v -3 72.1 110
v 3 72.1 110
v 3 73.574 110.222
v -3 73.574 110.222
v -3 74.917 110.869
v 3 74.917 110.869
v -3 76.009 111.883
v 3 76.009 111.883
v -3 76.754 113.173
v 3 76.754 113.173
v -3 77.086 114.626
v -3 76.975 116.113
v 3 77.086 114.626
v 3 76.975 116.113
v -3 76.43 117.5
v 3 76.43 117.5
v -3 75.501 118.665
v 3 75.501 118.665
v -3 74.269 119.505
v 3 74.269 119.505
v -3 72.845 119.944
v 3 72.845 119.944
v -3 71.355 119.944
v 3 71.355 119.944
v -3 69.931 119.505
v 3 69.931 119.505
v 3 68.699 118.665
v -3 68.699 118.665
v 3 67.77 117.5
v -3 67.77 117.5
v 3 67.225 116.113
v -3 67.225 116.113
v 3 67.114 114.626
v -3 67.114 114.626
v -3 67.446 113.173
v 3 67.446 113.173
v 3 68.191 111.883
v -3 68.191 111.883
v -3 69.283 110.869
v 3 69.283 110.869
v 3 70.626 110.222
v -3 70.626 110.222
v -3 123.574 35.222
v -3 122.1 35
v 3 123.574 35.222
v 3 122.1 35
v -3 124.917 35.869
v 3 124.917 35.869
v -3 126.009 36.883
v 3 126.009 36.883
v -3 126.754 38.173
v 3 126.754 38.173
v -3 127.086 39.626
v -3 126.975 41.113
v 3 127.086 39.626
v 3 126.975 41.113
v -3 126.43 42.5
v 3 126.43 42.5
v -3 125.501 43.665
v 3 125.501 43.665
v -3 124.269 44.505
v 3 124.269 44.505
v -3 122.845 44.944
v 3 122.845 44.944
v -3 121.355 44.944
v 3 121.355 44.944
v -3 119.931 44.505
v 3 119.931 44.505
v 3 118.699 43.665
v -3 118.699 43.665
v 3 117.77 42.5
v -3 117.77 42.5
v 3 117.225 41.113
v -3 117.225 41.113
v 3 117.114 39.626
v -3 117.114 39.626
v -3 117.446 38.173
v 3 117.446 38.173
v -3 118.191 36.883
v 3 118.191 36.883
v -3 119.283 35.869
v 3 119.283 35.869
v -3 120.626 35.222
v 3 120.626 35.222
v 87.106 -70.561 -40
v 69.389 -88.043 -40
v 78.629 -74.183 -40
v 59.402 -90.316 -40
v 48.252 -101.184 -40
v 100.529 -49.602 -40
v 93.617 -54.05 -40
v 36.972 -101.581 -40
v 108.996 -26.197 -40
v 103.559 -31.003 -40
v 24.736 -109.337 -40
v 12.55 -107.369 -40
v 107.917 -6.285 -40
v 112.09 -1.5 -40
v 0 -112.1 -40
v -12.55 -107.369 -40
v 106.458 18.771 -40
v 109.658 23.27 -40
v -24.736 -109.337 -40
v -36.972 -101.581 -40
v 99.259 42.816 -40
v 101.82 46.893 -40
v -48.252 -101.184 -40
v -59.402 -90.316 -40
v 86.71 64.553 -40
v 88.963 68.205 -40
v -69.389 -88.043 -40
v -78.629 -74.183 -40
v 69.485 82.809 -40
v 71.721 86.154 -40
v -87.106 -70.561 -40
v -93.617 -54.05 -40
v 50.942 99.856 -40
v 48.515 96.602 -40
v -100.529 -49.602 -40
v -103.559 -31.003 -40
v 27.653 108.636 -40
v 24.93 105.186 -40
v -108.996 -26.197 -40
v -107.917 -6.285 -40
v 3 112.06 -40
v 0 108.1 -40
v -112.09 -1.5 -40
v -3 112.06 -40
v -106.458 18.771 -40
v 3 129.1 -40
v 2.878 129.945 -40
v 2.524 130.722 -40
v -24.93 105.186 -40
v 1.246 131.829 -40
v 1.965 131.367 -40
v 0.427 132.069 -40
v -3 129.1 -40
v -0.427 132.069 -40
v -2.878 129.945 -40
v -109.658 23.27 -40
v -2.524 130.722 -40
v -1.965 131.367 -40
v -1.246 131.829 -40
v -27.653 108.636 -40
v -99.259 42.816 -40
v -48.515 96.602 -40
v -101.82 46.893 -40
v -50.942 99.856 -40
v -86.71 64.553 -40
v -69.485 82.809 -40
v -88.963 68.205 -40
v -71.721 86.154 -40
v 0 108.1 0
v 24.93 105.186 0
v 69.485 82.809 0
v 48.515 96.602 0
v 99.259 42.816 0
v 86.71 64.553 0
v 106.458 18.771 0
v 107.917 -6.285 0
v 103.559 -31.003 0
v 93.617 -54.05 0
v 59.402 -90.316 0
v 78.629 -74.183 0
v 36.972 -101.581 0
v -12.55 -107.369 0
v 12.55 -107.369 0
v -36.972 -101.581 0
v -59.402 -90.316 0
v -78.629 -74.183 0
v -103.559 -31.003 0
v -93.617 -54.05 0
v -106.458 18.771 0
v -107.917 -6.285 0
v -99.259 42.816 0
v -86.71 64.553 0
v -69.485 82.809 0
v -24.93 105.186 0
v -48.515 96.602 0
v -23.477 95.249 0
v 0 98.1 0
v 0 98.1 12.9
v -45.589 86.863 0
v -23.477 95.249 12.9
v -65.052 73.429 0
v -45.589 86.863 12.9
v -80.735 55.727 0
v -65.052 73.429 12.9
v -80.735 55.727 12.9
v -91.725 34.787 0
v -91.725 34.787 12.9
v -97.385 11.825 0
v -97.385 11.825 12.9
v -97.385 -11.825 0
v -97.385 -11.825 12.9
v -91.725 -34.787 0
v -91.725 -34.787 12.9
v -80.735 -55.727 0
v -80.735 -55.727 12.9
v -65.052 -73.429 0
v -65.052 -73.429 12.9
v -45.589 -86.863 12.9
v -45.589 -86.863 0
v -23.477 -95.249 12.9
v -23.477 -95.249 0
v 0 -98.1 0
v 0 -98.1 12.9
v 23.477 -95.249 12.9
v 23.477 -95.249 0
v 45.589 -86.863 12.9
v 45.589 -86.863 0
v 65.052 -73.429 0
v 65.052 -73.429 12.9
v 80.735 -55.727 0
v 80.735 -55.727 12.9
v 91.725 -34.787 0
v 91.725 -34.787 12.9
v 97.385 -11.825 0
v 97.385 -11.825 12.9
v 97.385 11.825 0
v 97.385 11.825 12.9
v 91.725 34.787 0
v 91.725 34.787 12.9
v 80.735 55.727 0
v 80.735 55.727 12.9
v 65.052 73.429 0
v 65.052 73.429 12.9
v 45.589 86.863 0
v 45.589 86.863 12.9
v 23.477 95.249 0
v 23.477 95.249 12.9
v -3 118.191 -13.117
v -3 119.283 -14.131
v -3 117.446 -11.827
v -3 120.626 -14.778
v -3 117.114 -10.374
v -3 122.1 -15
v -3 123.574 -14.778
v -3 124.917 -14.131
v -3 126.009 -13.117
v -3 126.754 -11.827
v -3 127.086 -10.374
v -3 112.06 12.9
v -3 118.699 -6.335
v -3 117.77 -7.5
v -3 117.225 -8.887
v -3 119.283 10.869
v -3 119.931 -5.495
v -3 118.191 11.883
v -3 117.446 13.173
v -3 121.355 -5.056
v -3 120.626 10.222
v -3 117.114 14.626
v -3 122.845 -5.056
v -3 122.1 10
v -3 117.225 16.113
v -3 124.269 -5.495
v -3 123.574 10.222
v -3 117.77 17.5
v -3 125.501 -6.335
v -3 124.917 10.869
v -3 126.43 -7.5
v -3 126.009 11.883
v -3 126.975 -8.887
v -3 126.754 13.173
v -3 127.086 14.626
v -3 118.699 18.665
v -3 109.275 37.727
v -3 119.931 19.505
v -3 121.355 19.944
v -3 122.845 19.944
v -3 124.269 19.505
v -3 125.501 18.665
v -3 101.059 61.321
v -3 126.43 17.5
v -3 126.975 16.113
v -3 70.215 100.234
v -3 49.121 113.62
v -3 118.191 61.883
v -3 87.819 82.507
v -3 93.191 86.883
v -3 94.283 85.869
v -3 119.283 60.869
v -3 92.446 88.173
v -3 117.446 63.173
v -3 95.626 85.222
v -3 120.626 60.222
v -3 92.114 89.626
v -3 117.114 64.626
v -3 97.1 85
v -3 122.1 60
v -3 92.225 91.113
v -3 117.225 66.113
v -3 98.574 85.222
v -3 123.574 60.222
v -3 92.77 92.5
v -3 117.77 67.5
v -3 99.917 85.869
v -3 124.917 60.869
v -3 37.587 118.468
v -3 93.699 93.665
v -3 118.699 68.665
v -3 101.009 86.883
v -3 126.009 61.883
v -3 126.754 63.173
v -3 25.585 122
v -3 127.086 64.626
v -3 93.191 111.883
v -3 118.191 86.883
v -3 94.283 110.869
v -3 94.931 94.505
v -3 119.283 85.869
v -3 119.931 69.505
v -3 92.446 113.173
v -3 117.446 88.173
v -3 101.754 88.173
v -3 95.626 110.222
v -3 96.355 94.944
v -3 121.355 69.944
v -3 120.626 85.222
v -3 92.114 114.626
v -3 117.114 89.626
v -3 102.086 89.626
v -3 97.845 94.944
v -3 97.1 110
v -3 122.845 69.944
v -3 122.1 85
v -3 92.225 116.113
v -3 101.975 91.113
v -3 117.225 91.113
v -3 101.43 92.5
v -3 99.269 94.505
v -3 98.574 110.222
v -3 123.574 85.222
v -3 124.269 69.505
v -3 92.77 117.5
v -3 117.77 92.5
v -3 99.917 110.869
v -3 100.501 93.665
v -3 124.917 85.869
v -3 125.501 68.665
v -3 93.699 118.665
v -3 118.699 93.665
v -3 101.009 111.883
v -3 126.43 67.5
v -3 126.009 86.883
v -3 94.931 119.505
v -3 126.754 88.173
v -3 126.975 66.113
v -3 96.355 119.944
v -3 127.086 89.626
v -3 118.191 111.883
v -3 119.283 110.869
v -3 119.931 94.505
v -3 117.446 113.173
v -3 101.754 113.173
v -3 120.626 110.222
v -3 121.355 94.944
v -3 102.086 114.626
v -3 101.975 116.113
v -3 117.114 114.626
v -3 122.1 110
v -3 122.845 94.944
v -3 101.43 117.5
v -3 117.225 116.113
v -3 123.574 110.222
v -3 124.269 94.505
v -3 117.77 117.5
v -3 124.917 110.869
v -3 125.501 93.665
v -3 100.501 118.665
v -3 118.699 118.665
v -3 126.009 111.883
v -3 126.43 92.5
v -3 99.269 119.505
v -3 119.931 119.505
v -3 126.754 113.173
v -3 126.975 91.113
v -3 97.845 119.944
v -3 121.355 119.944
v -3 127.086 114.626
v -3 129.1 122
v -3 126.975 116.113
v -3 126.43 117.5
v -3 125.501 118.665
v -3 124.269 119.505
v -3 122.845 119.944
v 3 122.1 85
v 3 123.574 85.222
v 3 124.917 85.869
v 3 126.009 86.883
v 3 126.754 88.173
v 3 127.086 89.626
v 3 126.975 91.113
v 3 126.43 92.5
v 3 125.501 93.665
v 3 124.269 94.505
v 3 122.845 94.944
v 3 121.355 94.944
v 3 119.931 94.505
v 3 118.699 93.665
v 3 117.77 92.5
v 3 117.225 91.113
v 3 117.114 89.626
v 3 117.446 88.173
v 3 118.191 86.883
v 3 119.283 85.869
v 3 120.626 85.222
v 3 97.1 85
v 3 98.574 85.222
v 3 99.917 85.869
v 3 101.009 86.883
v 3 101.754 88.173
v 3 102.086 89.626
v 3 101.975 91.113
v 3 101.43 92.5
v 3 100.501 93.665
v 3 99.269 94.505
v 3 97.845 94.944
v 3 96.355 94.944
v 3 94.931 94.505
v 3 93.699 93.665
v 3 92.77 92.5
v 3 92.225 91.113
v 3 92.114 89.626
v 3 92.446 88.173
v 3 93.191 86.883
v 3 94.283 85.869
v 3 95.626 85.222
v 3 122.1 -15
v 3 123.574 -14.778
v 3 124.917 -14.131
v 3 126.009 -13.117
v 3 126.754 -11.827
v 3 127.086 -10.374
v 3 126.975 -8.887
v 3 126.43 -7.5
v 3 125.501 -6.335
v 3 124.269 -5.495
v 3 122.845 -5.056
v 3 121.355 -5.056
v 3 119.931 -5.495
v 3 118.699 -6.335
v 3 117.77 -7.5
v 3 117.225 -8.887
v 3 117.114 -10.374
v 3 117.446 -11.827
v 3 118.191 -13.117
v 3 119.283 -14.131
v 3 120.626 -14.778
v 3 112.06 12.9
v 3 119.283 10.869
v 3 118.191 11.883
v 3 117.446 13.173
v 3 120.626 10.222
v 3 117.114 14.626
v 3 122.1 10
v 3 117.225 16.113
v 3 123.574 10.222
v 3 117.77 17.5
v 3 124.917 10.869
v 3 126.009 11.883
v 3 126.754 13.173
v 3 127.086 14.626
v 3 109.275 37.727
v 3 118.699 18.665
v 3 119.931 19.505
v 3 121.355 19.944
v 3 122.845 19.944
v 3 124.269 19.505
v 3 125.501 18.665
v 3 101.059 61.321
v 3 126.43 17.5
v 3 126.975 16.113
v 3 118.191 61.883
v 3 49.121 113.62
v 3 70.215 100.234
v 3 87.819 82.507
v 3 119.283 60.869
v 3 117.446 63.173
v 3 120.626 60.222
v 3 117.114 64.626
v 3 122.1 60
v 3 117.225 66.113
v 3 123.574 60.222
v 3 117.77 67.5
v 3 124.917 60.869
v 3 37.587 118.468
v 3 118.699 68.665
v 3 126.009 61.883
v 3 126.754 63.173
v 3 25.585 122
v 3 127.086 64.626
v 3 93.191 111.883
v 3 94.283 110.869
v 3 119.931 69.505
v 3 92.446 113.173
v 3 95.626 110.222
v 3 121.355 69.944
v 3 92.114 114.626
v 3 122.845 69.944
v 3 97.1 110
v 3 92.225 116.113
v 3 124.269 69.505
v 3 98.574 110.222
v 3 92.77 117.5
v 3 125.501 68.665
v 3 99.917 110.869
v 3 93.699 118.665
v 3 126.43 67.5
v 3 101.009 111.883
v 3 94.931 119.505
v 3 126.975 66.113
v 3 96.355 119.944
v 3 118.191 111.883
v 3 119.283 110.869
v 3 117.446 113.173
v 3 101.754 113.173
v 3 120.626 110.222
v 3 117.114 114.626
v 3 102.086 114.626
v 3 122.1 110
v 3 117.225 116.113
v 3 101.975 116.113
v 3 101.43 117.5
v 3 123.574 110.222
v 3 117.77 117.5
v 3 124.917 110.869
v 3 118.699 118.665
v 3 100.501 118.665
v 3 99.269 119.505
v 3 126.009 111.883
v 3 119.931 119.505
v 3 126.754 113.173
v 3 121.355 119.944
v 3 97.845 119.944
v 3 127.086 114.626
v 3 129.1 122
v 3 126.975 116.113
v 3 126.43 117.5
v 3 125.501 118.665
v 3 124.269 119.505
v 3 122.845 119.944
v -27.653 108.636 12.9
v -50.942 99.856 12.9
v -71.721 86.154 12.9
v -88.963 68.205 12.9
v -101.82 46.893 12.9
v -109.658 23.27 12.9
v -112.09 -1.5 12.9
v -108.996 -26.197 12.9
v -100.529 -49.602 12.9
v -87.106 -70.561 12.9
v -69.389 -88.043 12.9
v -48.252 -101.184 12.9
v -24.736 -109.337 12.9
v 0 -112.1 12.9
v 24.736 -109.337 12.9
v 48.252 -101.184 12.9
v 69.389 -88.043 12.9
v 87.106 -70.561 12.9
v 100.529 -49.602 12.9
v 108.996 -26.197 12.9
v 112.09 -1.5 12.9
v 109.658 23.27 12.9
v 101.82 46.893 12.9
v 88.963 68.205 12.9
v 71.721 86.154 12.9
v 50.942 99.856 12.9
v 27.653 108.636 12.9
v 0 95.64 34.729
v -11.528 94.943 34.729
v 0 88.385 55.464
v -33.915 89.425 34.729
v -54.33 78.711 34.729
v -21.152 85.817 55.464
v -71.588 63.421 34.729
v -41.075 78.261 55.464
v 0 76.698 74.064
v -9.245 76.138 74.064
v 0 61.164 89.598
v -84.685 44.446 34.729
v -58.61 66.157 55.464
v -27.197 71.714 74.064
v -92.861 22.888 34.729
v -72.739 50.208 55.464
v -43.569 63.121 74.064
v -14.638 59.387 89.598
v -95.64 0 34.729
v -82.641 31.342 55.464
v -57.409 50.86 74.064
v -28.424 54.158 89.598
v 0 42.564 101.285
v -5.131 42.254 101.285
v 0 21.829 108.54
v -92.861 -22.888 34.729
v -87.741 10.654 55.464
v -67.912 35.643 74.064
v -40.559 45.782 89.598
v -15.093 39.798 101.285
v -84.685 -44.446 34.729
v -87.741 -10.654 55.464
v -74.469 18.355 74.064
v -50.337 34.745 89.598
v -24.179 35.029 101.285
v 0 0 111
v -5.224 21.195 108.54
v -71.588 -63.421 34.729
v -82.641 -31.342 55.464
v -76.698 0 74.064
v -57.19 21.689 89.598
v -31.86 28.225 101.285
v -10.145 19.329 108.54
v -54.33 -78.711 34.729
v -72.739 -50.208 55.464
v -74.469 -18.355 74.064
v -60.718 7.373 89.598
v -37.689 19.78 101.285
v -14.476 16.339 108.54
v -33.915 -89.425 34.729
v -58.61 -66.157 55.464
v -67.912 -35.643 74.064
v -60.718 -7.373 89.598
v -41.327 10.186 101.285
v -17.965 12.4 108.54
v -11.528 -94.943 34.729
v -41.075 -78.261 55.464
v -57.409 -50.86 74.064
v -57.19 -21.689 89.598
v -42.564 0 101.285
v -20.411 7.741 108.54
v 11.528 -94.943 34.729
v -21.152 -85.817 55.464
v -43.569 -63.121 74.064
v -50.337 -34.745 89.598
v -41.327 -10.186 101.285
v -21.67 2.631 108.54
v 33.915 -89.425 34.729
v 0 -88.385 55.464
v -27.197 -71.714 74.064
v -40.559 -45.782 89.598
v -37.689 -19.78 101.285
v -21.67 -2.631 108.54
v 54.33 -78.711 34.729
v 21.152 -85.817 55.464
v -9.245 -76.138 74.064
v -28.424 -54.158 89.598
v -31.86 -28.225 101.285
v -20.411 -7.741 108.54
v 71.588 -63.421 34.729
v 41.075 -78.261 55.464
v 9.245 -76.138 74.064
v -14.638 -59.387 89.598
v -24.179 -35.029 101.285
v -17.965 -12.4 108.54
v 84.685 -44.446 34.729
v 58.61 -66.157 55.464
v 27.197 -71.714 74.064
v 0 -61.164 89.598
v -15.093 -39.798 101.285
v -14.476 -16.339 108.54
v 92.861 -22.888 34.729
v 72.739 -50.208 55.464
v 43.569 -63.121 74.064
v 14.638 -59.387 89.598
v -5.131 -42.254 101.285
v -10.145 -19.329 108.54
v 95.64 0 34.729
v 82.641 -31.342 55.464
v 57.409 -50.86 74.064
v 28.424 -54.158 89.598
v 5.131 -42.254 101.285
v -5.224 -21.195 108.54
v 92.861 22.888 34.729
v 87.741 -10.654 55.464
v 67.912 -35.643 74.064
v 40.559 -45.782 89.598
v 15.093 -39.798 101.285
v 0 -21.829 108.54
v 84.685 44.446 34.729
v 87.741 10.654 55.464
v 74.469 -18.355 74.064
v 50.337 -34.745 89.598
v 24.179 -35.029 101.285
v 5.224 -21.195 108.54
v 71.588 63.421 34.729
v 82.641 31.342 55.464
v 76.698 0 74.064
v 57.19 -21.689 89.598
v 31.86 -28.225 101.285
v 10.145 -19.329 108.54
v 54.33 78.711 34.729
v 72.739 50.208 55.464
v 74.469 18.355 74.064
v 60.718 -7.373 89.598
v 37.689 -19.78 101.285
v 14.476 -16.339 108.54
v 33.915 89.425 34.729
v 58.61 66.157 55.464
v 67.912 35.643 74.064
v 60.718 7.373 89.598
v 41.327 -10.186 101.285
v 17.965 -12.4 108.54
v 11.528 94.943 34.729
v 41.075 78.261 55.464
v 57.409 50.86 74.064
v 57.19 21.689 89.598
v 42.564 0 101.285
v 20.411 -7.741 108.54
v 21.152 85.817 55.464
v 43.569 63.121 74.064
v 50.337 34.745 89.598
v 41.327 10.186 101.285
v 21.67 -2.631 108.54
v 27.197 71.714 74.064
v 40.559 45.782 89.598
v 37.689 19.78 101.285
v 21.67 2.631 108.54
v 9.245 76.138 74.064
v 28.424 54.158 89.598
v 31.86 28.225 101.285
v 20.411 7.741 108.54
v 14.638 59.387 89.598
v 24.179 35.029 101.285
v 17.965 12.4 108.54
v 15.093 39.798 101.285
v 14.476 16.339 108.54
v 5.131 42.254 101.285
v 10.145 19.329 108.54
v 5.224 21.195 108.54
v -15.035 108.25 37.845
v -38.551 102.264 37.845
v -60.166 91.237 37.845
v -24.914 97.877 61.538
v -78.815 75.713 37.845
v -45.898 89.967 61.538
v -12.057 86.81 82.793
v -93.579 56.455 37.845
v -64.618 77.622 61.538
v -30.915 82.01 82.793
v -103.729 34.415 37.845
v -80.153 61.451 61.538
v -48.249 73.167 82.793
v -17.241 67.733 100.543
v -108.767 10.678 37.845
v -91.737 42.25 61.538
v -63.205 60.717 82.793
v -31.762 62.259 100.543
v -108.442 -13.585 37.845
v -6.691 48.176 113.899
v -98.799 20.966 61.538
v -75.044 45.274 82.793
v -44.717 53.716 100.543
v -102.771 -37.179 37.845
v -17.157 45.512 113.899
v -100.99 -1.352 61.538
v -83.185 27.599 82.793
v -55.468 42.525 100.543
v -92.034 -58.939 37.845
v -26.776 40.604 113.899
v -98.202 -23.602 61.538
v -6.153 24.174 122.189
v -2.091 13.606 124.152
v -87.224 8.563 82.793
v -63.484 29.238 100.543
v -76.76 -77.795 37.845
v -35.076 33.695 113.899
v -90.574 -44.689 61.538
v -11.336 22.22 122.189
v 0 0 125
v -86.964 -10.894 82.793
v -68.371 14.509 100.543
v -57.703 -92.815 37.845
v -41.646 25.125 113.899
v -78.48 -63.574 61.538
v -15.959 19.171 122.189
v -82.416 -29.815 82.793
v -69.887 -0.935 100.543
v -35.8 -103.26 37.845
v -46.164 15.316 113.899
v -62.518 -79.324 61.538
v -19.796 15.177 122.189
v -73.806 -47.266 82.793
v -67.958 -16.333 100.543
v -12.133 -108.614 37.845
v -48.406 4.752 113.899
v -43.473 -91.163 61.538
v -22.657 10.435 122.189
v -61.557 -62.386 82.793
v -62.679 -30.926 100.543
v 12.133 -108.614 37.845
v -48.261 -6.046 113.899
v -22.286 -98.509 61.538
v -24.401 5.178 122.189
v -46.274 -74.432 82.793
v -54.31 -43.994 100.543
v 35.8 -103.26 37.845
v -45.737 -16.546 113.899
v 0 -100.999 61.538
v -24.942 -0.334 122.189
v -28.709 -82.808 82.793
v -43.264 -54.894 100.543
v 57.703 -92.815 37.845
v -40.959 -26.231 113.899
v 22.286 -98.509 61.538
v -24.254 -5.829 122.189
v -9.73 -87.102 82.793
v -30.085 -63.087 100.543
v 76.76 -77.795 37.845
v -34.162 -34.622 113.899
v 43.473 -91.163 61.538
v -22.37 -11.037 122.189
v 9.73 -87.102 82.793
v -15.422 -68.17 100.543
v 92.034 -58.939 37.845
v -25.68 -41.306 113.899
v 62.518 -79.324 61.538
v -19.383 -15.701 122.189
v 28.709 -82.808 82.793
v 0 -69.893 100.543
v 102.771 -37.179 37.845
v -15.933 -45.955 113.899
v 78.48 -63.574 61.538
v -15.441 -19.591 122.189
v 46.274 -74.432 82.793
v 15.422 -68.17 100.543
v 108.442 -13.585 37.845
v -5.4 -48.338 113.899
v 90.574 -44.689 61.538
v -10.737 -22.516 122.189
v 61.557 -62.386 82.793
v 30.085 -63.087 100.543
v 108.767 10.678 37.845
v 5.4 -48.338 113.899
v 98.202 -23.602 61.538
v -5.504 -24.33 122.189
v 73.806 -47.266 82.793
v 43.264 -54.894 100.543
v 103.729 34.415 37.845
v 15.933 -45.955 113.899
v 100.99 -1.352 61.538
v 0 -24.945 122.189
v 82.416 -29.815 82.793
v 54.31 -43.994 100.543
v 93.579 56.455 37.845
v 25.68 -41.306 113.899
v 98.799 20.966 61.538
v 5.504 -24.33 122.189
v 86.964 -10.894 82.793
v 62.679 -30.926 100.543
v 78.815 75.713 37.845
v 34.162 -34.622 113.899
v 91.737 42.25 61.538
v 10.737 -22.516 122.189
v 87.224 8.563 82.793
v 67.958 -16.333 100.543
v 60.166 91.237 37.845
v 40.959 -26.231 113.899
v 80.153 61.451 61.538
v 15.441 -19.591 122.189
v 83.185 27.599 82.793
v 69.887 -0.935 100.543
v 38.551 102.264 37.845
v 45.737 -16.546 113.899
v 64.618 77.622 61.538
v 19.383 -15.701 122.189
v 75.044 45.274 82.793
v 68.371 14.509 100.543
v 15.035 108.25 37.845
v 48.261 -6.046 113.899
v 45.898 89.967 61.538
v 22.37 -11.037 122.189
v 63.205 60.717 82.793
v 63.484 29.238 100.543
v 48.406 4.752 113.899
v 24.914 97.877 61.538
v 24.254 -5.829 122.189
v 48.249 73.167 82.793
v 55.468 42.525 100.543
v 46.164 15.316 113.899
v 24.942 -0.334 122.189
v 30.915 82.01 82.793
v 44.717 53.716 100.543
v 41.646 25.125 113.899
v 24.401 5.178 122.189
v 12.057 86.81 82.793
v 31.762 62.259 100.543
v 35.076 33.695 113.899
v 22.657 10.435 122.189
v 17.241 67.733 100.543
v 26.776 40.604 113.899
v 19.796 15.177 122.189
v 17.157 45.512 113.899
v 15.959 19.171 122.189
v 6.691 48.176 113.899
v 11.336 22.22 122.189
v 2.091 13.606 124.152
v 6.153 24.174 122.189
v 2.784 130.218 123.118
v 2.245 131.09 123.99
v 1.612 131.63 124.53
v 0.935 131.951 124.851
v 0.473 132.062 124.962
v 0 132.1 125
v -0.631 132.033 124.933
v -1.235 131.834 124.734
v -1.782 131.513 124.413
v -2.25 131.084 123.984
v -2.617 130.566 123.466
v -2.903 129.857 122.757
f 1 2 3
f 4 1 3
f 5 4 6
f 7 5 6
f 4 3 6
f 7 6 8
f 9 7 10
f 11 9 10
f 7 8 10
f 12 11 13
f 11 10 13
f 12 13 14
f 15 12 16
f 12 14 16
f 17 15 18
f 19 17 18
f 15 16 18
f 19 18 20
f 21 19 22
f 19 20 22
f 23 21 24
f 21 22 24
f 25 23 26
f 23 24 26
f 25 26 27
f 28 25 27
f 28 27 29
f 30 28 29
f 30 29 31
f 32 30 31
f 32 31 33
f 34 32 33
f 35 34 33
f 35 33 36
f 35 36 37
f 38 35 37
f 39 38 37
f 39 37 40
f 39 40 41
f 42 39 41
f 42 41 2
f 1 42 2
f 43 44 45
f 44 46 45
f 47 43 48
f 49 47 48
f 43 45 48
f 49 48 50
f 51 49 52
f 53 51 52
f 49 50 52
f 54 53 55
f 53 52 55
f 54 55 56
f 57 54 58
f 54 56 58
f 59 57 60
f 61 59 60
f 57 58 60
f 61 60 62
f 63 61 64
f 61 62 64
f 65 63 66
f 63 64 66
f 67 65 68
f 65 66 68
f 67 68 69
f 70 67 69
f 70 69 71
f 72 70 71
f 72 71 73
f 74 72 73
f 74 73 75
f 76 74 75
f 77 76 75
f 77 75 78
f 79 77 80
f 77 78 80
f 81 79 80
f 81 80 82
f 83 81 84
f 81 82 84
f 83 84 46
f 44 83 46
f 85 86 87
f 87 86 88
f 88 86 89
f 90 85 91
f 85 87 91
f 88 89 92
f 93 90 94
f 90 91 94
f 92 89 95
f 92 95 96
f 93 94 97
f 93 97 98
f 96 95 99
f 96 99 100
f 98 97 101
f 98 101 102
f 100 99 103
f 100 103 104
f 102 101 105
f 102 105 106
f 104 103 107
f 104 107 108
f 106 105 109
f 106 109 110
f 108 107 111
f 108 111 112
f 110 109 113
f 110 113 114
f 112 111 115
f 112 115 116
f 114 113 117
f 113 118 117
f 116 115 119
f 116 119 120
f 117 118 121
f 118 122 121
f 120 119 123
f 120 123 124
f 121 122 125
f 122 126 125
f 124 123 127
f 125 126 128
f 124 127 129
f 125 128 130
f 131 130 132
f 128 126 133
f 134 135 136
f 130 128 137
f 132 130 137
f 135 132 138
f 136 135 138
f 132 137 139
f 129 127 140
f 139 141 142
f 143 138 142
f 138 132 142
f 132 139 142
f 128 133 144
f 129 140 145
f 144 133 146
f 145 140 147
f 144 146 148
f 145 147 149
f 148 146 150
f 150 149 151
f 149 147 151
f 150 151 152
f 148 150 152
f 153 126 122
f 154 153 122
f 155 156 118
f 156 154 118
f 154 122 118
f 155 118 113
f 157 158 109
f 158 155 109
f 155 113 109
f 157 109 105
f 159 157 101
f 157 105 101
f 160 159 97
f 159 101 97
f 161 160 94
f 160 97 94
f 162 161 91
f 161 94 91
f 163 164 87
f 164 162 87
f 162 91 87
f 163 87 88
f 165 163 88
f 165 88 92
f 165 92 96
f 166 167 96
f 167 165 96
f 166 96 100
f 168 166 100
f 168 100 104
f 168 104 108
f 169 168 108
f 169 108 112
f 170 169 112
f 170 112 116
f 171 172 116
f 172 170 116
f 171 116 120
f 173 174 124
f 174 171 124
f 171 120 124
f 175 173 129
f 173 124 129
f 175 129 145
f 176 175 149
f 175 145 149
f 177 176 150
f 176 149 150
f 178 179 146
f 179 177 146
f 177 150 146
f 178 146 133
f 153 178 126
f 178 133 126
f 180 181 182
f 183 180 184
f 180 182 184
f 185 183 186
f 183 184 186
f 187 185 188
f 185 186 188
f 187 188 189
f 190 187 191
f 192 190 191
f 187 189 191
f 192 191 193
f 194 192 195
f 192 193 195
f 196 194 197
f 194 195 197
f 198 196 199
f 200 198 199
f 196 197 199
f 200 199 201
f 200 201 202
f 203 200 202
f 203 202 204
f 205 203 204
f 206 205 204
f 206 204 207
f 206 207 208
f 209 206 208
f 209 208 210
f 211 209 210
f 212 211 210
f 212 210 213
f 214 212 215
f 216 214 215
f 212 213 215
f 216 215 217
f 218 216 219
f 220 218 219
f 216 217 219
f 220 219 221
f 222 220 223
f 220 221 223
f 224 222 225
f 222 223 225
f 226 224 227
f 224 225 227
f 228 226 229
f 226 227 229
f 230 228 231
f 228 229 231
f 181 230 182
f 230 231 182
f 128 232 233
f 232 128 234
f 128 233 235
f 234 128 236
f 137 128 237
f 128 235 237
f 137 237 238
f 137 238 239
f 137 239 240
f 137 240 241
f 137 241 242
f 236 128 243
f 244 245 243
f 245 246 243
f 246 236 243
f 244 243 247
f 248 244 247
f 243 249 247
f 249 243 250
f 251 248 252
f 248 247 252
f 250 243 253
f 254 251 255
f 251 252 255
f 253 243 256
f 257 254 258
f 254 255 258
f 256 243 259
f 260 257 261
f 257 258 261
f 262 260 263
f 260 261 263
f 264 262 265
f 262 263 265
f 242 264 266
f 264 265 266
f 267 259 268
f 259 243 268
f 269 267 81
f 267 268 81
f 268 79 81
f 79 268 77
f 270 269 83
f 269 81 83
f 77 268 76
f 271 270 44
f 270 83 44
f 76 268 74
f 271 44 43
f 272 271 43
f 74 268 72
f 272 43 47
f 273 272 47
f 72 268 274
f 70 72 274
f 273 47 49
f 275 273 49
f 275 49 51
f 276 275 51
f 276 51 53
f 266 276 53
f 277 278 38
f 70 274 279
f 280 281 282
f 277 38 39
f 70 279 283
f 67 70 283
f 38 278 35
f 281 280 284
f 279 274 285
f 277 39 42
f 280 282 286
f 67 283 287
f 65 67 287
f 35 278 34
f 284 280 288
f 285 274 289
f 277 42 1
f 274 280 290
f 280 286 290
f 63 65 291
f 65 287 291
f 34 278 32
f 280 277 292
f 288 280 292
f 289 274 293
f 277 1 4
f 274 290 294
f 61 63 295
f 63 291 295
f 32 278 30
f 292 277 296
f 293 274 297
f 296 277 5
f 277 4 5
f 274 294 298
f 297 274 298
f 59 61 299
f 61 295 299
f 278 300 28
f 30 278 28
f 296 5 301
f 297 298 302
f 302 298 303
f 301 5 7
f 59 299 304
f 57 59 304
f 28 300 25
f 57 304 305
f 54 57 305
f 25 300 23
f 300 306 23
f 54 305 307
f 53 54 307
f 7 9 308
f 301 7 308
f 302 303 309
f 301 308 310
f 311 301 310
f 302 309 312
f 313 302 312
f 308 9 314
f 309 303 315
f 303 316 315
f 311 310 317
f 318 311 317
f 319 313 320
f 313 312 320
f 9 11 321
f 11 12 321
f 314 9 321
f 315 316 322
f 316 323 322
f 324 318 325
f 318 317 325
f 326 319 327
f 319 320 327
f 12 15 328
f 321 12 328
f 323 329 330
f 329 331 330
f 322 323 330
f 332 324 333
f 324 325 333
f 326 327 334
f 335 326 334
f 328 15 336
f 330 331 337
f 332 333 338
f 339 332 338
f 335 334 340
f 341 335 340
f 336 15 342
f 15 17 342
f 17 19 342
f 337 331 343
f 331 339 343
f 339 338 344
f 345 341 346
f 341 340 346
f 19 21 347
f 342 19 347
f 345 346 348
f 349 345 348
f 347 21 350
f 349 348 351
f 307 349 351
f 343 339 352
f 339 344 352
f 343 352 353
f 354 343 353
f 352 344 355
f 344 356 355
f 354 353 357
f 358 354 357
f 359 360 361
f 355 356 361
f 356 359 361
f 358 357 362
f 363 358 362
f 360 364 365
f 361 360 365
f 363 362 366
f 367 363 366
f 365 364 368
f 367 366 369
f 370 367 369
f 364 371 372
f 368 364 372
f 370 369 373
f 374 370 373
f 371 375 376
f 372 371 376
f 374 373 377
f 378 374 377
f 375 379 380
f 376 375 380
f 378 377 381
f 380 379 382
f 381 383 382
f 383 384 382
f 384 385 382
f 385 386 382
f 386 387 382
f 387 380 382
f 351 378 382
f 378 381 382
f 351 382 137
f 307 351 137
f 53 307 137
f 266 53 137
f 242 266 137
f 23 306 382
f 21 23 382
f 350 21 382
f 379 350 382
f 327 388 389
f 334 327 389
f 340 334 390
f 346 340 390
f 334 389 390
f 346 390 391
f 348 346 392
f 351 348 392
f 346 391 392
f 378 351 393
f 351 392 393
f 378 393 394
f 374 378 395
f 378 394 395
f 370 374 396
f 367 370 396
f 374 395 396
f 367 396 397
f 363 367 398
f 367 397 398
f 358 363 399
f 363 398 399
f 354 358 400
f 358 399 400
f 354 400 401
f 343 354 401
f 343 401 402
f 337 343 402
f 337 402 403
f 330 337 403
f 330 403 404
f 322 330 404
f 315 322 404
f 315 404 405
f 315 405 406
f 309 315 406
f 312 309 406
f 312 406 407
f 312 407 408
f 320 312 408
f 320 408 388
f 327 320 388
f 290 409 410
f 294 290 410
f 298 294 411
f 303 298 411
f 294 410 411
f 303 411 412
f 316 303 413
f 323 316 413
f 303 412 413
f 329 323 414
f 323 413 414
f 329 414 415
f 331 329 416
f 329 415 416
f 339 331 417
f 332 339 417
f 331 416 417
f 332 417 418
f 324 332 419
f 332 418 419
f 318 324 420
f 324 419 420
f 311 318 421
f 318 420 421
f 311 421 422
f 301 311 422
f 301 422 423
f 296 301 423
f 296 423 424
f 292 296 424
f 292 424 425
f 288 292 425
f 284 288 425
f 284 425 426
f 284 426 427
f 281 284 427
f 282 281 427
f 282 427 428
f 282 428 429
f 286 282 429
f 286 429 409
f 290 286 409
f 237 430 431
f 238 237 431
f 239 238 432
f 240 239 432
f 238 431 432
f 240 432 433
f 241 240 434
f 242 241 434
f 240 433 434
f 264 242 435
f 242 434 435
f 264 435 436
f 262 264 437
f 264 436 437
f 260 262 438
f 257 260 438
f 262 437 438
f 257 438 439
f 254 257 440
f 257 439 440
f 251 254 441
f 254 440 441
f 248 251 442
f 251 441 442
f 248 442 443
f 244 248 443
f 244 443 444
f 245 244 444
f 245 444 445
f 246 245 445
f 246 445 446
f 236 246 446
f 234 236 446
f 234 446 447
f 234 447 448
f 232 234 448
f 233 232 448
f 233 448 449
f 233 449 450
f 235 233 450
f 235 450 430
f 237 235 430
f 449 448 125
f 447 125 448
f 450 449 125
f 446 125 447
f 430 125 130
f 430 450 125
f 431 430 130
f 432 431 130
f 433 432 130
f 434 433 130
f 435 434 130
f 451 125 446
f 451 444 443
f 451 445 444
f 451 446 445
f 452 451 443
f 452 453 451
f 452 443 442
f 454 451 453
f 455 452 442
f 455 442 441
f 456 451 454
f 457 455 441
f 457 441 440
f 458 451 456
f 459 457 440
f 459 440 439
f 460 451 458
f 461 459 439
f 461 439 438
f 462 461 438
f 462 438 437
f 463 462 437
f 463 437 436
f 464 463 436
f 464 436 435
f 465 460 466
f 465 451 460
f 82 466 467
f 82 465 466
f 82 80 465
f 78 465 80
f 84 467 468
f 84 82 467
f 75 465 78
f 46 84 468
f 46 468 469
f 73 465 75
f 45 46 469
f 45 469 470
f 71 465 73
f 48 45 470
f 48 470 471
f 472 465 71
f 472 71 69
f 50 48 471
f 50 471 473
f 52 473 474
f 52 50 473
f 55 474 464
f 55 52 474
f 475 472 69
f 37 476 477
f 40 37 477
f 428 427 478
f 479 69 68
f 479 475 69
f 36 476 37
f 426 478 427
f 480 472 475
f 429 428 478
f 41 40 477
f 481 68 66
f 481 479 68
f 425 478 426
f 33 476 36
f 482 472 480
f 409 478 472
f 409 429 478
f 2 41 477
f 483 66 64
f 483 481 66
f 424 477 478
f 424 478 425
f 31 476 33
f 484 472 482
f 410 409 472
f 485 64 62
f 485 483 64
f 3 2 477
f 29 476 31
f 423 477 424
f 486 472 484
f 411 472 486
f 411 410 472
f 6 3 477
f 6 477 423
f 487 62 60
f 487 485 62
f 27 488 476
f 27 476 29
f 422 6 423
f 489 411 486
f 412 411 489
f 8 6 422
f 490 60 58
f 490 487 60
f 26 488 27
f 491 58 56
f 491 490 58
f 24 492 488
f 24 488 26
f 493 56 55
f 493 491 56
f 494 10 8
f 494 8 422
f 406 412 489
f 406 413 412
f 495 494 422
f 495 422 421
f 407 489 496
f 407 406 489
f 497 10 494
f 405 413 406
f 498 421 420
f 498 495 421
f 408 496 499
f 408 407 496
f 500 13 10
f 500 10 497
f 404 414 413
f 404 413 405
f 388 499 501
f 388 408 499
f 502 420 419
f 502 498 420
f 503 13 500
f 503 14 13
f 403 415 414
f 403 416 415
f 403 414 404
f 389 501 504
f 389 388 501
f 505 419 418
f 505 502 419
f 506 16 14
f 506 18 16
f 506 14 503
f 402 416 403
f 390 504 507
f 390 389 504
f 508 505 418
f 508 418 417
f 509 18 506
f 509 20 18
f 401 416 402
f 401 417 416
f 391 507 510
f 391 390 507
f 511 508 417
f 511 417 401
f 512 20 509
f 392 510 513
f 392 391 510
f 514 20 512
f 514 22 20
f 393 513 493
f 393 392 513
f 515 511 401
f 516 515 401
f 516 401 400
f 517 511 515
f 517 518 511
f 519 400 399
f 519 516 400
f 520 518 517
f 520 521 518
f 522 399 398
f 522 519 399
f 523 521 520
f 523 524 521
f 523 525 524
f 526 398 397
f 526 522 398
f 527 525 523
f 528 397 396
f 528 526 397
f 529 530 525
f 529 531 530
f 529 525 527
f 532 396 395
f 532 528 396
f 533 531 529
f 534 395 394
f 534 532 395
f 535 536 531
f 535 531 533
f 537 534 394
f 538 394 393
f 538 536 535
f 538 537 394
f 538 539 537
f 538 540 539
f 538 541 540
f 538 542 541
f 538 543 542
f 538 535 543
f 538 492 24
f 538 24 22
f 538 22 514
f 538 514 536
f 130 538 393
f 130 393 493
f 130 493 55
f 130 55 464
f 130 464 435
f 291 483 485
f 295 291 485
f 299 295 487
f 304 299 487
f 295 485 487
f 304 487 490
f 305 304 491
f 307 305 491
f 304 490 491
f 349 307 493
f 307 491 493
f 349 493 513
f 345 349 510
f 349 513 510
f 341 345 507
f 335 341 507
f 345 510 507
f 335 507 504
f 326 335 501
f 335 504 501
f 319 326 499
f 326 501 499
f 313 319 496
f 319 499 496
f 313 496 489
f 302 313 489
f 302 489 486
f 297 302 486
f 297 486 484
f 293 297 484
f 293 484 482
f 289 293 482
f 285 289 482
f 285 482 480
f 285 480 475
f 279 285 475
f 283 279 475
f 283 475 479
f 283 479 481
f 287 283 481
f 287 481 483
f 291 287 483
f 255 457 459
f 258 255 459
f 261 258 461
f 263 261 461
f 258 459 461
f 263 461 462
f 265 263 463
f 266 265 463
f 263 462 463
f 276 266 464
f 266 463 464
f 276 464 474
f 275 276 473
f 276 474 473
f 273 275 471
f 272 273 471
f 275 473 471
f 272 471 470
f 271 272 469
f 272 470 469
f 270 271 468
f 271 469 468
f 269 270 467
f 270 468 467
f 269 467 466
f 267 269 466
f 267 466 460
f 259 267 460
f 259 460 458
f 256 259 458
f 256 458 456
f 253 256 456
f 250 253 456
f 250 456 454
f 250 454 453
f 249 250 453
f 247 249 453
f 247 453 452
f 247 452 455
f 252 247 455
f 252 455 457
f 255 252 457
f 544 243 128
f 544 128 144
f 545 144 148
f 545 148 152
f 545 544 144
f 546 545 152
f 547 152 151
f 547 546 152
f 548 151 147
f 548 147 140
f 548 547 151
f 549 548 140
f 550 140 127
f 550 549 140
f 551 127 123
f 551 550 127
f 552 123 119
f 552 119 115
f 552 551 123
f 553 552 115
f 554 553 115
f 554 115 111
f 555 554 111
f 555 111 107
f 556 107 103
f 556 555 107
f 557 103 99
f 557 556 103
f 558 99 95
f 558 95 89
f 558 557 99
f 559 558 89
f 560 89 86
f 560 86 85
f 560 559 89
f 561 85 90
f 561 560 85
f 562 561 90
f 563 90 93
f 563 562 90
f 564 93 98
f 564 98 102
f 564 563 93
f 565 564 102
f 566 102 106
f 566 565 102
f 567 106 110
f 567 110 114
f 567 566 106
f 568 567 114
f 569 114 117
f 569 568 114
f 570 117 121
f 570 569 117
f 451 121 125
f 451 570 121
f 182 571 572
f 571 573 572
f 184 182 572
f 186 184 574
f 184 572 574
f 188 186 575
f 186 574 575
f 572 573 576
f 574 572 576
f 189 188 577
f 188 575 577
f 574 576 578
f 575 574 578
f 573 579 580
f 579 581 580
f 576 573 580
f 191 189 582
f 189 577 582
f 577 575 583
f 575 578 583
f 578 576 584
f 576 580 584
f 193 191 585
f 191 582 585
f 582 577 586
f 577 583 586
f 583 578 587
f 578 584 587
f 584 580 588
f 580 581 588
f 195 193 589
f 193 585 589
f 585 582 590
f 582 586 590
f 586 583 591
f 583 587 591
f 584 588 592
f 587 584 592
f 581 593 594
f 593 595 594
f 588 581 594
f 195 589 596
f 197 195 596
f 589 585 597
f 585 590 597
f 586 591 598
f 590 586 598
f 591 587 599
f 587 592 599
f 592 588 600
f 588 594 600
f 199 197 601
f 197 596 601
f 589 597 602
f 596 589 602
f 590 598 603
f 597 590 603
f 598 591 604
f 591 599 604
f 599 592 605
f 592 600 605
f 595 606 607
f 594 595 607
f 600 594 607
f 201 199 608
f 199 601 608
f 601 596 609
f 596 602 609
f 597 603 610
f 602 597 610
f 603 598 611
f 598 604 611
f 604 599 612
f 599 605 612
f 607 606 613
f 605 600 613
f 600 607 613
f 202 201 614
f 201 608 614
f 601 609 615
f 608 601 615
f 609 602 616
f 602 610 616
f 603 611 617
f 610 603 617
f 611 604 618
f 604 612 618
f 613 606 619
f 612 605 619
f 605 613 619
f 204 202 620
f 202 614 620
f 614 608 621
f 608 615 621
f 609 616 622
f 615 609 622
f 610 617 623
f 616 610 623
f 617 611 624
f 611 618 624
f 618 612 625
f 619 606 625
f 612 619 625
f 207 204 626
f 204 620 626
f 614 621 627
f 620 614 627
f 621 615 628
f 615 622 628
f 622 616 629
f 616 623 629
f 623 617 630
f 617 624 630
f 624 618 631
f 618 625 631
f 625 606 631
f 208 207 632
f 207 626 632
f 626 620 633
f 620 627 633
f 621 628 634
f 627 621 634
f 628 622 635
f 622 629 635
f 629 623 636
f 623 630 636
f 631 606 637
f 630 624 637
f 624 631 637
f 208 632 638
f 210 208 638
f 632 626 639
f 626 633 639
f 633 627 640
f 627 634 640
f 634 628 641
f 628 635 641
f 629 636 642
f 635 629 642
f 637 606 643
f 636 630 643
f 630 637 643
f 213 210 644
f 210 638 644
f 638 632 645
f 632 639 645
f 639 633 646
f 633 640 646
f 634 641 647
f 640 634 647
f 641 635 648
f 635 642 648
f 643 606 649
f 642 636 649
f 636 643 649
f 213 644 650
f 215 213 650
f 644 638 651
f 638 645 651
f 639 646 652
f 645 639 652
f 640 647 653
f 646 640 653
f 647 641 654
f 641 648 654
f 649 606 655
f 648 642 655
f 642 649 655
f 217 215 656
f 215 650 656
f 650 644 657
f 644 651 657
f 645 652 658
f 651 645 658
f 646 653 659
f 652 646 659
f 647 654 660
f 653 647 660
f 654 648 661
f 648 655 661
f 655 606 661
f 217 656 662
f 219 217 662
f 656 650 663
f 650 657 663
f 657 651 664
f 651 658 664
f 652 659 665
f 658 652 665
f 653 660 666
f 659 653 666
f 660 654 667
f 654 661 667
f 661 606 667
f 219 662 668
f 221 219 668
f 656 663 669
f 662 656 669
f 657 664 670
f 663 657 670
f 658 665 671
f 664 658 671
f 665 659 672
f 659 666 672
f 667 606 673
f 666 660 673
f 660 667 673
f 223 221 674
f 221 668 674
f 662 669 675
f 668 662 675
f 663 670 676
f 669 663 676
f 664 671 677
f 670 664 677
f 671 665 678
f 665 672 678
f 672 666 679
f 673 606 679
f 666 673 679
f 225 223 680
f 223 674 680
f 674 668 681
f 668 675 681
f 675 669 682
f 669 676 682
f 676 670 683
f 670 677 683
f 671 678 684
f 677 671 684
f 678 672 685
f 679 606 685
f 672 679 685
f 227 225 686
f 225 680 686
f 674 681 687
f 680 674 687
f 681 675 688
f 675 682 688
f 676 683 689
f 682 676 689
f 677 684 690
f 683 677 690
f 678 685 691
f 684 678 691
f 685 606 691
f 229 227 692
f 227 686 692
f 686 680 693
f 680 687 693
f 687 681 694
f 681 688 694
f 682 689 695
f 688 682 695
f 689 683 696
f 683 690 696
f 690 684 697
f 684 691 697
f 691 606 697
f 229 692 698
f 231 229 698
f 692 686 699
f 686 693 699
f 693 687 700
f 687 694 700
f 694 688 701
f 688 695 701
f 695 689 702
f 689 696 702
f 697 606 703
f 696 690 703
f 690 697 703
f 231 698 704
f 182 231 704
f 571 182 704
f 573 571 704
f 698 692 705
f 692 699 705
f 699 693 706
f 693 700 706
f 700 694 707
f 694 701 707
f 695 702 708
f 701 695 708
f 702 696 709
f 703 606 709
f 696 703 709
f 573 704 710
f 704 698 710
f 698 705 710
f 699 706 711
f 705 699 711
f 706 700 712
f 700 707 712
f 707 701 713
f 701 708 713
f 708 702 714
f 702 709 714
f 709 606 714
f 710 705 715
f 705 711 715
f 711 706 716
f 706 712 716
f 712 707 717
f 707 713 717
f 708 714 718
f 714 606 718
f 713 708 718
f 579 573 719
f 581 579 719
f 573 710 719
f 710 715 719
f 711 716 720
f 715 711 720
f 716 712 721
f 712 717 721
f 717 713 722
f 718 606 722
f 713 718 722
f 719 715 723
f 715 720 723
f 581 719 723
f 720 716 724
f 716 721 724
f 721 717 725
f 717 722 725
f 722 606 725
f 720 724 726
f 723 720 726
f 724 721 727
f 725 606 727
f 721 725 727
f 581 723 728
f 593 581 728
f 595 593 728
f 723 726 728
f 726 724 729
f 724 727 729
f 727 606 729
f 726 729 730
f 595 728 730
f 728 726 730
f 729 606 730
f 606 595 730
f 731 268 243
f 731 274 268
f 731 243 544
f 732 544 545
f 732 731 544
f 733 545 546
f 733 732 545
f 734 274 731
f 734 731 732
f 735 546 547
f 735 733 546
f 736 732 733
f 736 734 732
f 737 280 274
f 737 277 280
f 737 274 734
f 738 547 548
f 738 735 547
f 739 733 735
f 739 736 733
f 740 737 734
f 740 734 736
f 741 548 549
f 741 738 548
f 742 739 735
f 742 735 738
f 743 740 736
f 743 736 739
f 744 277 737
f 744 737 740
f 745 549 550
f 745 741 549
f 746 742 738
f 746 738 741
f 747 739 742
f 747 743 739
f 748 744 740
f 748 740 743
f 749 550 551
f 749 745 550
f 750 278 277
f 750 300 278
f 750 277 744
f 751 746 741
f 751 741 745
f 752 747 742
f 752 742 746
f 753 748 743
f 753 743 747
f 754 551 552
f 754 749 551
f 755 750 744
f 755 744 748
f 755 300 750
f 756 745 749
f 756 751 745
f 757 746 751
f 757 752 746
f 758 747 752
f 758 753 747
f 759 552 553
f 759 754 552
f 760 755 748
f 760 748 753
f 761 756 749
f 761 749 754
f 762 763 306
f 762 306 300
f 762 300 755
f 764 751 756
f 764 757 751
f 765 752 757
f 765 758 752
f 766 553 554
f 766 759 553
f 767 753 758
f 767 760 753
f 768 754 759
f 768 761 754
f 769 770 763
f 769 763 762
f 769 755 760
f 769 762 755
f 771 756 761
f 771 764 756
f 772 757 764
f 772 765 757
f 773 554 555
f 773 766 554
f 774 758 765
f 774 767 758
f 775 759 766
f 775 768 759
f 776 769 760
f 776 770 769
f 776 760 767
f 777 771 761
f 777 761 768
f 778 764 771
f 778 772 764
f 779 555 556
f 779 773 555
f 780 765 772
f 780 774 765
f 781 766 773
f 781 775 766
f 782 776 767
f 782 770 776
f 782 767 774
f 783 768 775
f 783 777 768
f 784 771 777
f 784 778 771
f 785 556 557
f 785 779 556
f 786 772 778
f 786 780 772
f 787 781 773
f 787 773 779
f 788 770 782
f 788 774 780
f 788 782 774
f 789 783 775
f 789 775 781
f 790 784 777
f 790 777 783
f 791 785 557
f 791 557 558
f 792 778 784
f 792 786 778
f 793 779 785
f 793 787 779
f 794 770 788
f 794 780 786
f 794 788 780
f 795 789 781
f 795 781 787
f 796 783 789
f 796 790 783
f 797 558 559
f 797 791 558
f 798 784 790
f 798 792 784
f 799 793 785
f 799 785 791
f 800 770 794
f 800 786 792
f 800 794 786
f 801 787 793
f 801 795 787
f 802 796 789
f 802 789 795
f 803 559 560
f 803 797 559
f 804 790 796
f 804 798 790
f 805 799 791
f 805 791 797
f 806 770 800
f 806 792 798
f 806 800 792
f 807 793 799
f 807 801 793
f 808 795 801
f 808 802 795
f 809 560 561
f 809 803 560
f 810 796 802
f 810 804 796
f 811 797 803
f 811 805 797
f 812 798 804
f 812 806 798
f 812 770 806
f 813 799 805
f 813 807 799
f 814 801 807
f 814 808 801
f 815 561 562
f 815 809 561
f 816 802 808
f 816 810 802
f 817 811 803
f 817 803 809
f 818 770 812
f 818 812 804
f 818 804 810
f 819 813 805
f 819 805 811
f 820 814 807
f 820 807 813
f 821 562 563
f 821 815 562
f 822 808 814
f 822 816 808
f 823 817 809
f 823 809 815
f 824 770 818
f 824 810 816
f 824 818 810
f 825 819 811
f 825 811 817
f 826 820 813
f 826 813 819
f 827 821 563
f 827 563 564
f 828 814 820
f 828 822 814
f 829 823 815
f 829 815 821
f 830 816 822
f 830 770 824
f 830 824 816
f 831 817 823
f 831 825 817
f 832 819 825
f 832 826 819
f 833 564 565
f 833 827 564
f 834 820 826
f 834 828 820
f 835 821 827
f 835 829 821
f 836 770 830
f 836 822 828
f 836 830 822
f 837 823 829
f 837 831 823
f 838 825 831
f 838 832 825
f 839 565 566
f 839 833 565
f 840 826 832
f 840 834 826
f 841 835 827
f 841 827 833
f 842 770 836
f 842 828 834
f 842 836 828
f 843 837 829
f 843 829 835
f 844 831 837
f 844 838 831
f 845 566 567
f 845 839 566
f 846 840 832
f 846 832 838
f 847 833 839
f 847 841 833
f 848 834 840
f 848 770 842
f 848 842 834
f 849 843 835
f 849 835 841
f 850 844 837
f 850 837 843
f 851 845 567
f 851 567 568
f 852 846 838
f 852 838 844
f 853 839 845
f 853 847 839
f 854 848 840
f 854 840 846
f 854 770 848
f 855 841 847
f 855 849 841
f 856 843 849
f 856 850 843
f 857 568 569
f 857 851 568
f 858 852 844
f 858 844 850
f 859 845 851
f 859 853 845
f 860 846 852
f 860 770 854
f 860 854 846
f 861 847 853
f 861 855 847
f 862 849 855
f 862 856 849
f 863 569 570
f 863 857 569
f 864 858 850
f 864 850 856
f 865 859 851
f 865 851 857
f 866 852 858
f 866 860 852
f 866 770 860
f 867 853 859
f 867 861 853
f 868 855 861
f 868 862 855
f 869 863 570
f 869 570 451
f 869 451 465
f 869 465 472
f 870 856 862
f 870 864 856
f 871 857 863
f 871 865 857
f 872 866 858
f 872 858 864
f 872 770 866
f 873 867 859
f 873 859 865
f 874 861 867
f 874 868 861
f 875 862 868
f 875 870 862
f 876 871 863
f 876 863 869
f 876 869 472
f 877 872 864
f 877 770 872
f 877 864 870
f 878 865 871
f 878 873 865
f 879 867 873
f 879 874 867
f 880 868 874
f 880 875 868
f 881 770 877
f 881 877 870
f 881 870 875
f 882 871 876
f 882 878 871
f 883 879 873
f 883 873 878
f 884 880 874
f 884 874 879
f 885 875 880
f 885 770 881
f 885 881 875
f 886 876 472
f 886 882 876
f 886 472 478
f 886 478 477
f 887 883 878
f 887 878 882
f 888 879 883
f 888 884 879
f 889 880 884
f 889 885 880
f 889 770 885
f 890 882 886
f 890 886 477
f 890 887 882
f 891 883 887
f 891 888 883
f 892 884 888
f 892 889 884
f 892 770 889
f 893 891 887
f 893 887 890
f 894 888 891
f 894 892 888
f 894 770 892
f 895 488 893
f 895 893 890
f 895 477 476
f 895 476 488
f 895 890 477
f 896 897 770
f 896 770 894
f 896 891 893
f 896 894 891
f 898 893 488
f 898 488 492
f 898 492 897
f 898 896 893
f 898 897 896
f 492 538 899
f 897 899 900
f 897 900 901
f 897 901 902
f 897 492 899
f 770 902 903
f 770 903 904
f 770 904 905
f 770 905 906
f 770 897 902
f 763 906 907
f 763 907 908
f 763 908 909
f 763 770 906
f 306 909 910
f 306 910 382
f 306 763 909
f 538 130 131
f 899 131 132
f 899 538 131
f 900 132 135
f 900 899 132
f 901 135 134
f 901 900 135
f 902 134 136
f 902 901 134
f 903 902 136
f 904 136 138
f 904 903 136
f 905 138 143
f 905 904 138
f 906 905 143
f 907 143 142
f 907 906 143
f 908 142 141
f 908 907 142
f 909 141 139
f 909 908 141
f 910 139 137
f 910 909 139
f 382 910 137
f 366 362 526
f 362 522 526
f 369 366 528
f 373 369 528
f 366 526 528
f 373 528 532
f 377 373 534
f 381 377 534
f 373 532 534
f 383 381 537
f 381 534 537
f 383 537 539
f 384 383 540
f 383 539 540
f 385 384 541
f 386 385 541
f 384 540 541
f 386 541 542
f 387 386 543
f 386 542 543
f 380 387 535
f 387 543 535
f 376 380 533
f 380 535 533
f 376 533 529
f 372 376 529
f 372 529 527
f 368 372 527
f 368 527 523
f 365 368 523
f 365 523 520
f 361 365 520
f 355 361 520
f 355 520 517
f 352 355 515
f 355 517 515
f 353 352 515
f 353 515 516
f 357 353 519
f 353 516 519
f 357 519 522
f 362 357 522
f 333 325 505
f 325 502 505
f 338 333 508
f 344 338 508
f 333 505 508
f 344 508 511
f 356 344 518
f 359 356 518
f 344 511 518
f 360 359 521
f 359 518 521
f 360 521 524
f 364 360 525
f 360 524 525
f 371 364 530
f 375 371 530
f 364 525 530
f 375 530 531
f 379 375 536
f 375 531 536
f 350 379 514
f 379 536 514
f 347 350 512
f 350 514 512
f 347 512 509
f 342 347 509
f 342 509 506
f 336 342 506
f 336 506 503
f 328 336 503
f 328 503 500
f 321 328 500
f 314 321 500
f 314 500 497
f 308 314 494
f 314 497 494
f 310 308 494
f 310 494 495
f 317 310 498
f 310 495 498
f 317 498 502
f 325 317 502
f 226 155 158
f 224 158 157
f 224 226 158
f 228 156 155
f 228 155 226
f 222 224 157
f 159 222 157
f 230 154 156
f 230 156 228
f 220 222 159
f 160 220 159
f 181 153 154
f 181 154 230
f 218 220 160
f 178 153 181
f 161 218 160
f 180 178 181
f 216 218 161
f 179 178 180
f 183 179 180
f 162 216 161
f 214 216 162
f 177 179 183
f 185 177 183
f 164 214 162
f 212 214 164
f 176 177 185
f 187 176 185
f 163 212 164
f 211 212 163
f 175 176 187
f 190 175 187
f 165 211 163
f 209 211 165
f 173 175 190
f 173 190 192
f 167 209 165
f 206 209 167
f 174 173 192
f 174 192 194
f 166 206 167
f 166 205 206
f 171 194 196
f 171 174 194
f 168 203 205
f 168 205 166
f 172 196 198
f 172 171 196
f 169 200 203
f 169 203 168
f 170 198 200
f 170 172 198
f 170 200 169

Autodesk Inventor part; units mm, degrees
ref_plane "YZ Plane" through (0, 0, 0) normal (1, 0, 0) x (0, 1, 0)
ref_plane "XZ Plane" through (0, 0, 0) normal (0, 1, 0) x (-1, 0, 0)
sketch "Sketch1" plane through (0, 0, 0) normal (1, 0, 0) x (0, 1, 0)
  line L0 (107.6, 0) -> (-107.6, 0) construction
  line L1 (108.1, 0) -> (108.1, -40)
  line L2 (108.1, -40) -> (112.1, -40)
  line L3 (112.1, -40) -> (112.1, 12.9)
  line L4 (0, 0) -> (0, 125)
  arc A0 (112.1, 12.9) -> (0, 125) centre (0, 12.9) ccw
  line L5 (108.1, 0) -> (0, 0)
  line L6 (98.1, 0) -> (98.1, 12.9)
  arc A1 (98.1, 12.9) -> (0, 111) centre (0, 12.9) ccw
  line L7 (99.6, 0) -> (99.6, -254) construction
  line L8 (107.6, -254) -> (107.6, 0) construction
  dimension "d0" = 125
  dimension "d2" = 40
  dimension "d5" = 10
  dimension "d8" = 0.5
  dimension "d9" = 4
revolve "Revolution1" add sketch "Sketch1" angle 360 about axis through (0, 0, 0) along (0, 0, 1) contours L5 L6 A1 L4 A0 L3 L2 L1
ref_plane "Work Plane1" through (0, 108.1, -624) normal (0, 0, 1) x (1, 0, 0)
sketch "Sketch6" plane through (0, 0, 0) normal (1, 0, 0) x (0, 1, 0)
  arc A0 (112.1, 12.9) -> (-112.1, 12.9) centre (0, 12.9) ccw construction
  arc A1 (98.1, 12.9) -> (-98.1, 12.9) centre (0, 12.9) ccw construction
  line L0 (98.1, 12.9) -> (98.1, 0) construction
  line L1 (112.1, -40) -> (112.1, 12.9) construction
  line L2 (108.1, 0) -> (108.1, -40) construction
  line L3 (108.1, 0) -> (-108.1, 0) construction
  line L4 (112.1, 12.9) -> (-112.1, 12.9) construction
  arc A2 (108.1, 12.9) -> (0, 121) centre (0, 12.9) ccw
  line L5 (0, 125) -> (132.1, 125)
  line L6 (132.1, 125) -> (132.1, -40)
  line L7 (132.1, -40) -> (108.1, -40)
  line L8 (108.1, 12.9) -> (108.1, -40)
  line L9 (112.1, -40) -> (-112.1, -40) projected
  line L10 (0, 125) -> (0, 121)
  point P0 (0, 0)
  point P1 (0, 0)
  dimension "d33" = 20
extrude "Extrusion5" add sketch "Sketch6" along normal mid plane 6
sketch "Sketch7" plane through (3, 0, 0) normal (1, 0, 0) x (0, 0, -1)
  arc A0 (-12.9, 112.0599) -> (-124.9599, 0) centre (-12.9, 0) ccw construction
  line L0 (40, 112.0599) -> (-12.9, 112.0599) construction
  line L1 (40, 112.0599) -> (40, 132.1) construction
  line L2 (40, 132.1) -> (-125, 132.1) construction
  line L3 (-125, 132.1) -> (-125, 0) construction
  circle A1 centre (-115, 72.1) radius 5
  circle A2 centre (-115, 97.1) radius 5
  circle A3 centre (-115, 122.1) radius 5
  circle A4 centre (-90, 122.1) radius 5
  circle A5 centre (-65, 122.1) radius 5
  circle A6 centre (-40, 122.1) radius 5
  circle A7 centre (-15, 122.1) radius 5
  circle A8 centre (10, 122.1) radius 5
  circle A9 centre (-90, 97.1) radius 5
  line L4 (-125, 0) -> (-124.9599, 0) projected
  point P0 (0, 0)
  dimension "d37" = 10
  dimension "d38" = 10
  dimension "d39" = 10
  dimension "d40" = 10
  dimension "d41" = 10
  dimension "d42" = 10
  dimension "d43" = 10
  dimension "d44" = 10
  dimension "d45" = 10
  dimension "d46" = 25
  dimension "d47" = 25
  dimension "d50" = 25
  dimension "d51" = 25
  dimension "d52" = 25
  dimension "d53" = 25
  dimension "d54" = 10
  dimension "d55" = 25
  dimension "d56" = 10
extrude "Extrusion6" cut sketch "Sketch7" against normal through all
fillet "Fillet3" radius 3 4 edges at (3, 66.05, 125) (-3, 66.05, 125) (-3, 132.1, 42.5) (3, 132.1, 42.5)
properties part number "FrontCapV1_3DPrint"
